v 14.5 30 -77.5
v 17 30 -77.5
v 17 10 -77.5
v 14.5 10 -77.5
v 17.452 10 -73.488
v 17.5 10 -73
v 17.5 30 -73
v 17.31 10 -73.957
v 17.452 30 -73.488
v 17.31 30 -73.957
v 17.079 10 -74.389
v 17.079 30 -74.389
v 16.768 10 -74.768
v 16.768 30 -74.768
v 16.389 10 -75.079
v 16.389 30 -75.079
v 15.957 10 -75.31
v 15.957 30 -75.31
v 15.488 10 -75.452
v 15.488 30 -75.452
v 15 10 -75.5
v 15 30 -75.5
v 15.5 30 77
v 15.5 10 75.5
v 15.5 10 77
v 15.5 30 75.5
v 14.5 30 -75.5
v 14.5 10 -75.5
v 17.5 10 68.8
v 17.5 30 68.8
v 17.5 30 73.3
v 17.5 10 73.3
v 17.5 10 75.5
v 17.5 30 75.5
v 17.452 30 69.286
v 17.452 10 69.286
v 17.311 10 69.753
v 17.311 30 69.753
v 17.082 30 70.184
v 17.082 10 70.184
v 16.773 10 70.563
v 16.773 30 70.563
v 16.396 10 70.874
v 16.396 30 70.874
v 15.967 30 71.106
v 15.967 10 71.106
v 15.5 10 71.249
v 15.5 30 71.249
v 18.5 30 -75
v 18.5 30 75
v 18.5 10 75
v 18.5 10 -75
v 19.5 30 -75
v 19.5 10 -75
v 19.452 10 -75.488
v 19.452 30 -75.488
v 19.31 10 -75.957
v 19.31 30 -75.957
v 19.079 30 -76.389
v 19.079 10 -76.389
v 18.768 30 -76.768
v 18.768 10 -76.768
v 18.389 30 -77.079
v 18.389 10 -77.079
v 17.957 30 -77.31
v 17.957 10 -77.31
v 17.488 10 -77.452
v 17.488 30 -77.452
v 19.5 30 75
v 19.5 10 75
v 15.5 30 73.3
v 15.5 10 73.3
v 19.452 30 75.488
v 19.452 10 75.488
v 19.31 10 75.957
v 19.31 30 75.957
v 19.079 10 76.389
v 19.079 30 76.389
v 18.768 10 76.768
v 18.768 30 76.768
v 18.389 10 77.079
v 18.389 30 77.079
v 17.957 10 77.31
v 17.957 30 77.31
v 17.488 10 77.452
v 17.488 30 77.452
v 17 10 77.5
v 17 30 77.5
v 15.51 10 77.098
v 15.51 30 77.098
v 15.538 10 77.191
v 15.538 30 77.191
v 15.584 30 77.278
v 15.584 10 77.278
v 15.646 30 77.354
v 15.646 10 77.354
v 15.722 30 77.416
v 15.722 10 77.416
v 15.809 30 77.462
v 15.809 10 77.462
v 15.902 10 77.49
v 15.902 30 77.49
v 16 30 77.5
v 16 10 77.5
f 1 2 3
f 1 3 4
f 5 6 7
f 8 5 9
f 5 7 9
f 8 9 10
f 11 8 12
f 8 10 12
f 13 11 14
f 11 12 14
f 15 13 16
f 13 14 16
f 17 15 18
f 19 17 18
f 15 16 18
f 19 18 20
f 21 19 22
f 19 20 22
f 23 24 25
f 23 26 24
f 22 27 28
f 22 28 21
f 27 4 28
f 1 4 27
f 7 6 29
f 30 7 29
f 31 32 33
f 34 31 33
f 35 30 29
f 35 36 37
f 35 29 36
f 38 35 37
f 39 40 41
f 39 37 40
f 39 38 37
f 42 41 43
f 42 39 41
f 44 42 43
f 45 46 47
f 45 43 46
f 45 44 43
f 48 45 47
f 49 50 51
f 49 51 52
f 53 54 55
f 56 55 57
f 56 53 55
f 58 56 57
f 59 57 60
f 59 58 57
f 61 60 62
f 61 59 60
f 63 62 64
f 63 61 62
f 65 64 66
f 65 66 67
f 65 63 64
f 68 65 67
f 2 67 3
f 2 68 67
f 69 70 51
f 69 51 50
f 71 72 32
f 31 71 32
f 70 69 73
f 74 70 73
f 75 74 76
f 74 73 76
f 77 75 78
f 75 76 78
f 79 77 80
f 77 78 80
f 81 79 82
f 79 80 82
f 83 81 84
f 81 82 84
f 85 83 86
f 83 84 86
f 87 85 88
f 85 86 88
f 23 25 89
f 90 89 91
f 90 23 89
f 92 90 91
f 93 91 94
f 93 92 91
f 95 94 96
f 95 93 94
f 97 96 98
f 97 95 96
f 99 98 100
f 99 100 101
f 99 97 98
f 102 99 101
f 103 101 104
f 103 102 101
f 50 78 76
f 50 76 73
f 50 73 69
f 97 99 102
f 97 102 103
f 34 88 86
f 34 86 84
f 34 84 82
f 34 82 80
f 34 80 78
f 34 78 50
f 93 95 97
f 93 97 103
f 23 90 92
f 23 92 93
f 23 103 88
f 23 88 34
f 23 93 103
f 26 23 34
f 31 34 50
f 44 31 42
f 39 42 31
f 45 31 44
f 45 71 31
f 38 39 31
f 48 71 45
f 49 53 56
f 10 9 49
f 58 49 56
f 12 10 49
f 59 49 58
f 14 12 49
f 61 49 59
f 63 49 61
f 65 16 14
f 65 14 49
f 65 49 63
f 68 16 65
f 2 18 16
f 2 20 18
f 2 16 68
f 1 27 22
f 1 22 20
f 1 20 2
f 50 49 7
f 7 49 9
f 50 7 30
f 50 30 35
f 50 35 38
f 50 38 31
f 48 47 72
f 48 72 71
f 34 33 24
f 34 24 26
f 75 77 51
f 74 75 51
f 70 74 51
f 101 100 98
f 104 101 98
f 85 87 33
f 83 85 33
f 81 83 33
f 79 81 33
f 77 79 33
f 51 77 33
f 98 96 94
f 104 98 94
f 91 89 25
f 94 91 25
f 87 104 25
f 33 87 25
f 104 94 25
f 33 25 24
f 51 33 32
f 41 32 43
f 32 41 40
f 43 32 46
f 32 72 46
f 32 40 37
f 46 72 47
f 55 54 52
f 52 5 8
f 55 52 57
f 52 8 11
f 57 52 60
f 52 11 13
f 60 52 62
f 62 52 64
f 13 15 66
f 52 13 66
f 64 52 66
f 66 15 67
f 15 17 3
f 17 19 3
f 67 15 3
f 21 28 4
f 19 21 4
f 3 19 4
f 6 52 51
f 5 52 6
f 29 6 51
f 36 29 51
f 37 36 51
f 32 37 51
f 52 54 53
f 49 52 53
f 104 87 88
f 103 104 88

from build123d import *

# Parameters (mm, degrees)
SKETCH1_W                       = 39
SKETCH1_H                       = 155
BOSS_EXTRUDE1_DEPTH             = 2
BOSS_EXTRUDE2_DEPTH             = 38
SKETCH3_W                       = 2
SKETCH3_H                       = 2
BOSS_EXTRUDE3_DEPTH             = 38
SKETCH4_W                       = 2
SKETCH4_H                       = 2
BOSS_EXTRUDE4_DEPTH             = 151
SKETCH6_W                       = 35
SKETCH6_H                       = 2.2
CUT_EXTRUDE1_DEPTH              = 160.340045186
SKETCH7_W                       = 35
SKETCH7_H                       = 2.2
CUT_EXTRUDE2_DEPTH              = 89.490112442
SKETCH5_W                       = 31
SKETCH5_H                       = 2
BOSS_EXTRUDE5_DEPTH             = 2
BOSS_EXTRUDE6_REACH             = 91.367
SKETCH8_W                       = 2
SKETCH8_H                       = 2
BOSS_EXTRUDE6_DIRECTION_2_REACH = 91.367
SKETCH10_W                      = 2
SKETCH10_H                      = 2.2
SKETCH10_W_2                    = 2.2
SKETCH10_H_2                    = 2
BOSS_EXTRUDE8_DEPTH             = 2
SKETCH11_W                      = 2
SKETCH11_H                      = 2.2
SKETCH11_W_2                    = 2.2
SKETCH11_H_2                    = 2
BOSS_EXTRUDE9_DEPTH             = 2
FILLET2_R                       = 2.5
SKETCH14_W                      = 36.5
SKETCH14_H                      = 7.75
BOSS_EXTRUDE10_DEPTH            = 2
SKETCH13_W                      = 31
SKETCH13_H                      = 3
CUT_EXTRUDE4_DEPTH              = 2
FILLET3_R                       = 2
FILLET4_R                       = 0.5
SKETCH15_R                      = 5.1
CUT_EXTRUDE5_DEPTH              = 90.367219941
SKETCH16_R                      = 7.1
BOSS_EXTRUDE11_DEPTH            = 1
FILLET5_R                       = 0.5
CUT_EXTRUDE3_DEPTH              = 160.340045186
FILLET6_R                       = 0.4
FILLET7_R                       = 0.5
CUT_EXTRUDE6_DEPTH              = 6
SKETCH18_W                      = 29
SKETCH18_H                      = 3
CUT_EXTRUDE8_DEPTH              = 90.367220028
CUT_EXTRUDE11_DEPTH             = 90.367220028
CUT_EXTRUDE11_DEPTH_BACK        = 90.367220028
SKETCH20_W                      = 29
SKETCH20_H                      = 34
SKETCH21_W                      = 155
SKETCH21_H                      = 10
CUT_EXTRUDE12_DEPTH             = 90.367219941
SKETCH22_W                      = 150
SKETCH22_H                      = 20
CUT_EXTRUDE13_DEPTH             = 1


with BuildPart() as part:
    # Sketch1 → Boss-Extrude1 (new body)
    with BuildSketch(Plane(origin=(0, 0, 0), x_dir=(1, 0, 0), z_dir=(0, 1, 0))):
        Rectangle(SKETCH1_W, SKETCH1_H)
    extrude(amount=BOSS_EXTRUDE1_DEPTH)

    # Sketch2 → Boss-Extrude2 (add)
    with BuildSketch(Plane(origin=(0, 2, 0), x_dir=(1, 0, 0), z_dir=(0, 1, 0))):
        Polygon((-17.5, -77.5), (-17.5, -75.5), (-17.5, 75.5), (17.5, 75.5), (17.5, -75.5), (17.5, -77.5), (19.5, -77.5), (19.5, 77.5), (-19.5, 77.5), (-19.5, -77.5), align=None)
    extrude(amount=BOSS_EXTRUDE2_DEPTH)

    # Sketch3 → Boss-Extrude3 (add)
    with BuildSketch(Plane(origin=(0, 2, 0), x_dir=(1, 0, 0), z_dir=(0, 1, 0))):
        with Locations((-16.5, -76.5)):
            Rectangle(SKETCH3_W, SKETCH3_H)
        with Locations((-16.5, -72.3)):
            Rectangle(SKETCH3_W, SKETCH3_H)
        with Locations((16.5, -76.5)):
            Rectangle(SKETCH3_W, SKETCH3_H)
        with Locations((16.5, -72.3)):
            Rectangle(SKETCH3_W, SKETCH3_H)
    extrude(amount=BOSS_EXTRUDE3_DEPTH)

    # Sketch4 → Boss-Extrude4 (add)
    with BuildSketch(Plane.XY.offset(-75.5)):
        with Locations((-16.5, 39)):
            Rectangle(SKETCH4_W, SKETCH4_H)
        Polygon((-15.5, 33.8), (-17.5, 31.8), (-17.5, 35.8), (-15.5, 35.8), align=None)
        Polygon((15.5, 35.8), (17.5, 35.8), (17.5, 31.8), (15.5, 33.8), align=None)
        with Locations((16.5, 39)):
            Rectangle(SKETCH4_W, SKETCH4_H)
    extrude(amount=BOSS_EXTRUDE4_DEPTH)

    # Sketch6 → Cut-Extrude1 (cut, through all)
    with BuildSketch(Plane.XY.offset(-75.5)):
        with Locations((0, 36.9)):
            Rectangle(SKETCH6_W, SKETCH6_H)
    extrude(amount=CUT_EXTRUDE1_DEPTH, mode=Mode.SUBTRACT)

    # Sketch7 → Cut-Extrude2 (cut, through all)
    with BuildSketch(Plane(origin=(0, 2, 0), x_dir=(1, 0, 0), z_dir=(0, 1, 0))):
        with Locations((0, -74.4)):
            Rectangle(SKETCH7_W, SKETCH7_H)
    extrude(amount=CUT_EXTRUDE2_DEPTH, mode=Mode.SUBTRACT)

    # Sketch5 → Boss-Extrude5 (add)
    with BuildSketch(Plane(origin=(0, 2, 0), x_dir=(1, 0, 0), z_dir=(0, 1, 0))):
        with Locations((0, -76.5)):
            Rectangle(SKETCH5_W, SKETCH5_H)
        with Locations((0, -72.3)):
            Rectangle(SKETCH5_W, SKETCH5_H)
    extrude(amount=BOSS_EXTRUDE5_DEPTH)

    # Boss-Extrude6: up to this face of the body (flat: up to its plane)
    boss_extrude6_end = Plane(part.part.faces().sort_by_distance((17.5, 16.9, -2.1))[0])
    # Sketch8 → Boss-Extrude6 (add, up to the picked face)
    with BuildSketch(Plane(origin=(0, 0, 0), x_dir=(0, 0, -1), z_dir=(1, 0, 0)), mode=Mode.PRIVATE) as boss_extrude6_sk1:
        with Locations((74.5, 39)):
            Rectangle(SKETCH8_W, SKETCH8_H)
    boss_extrude6_tool1 = split(extrude(boss_extrude6_sk1.sketch, amount=BOSS_EXTRUDE6_REACH, mode=Mode.PRIVATE), bisect_by=boss_extrude6_end, keep=Keep.BOTH, mode=Mode.PRIVATE)
    # Sketch8 → Boss-Extrude6 (add, up to the picked face)
    with BuildSketch(Plane(origin=(0, 0, 0), x_dir=(0, 0, -1), z_dir=(1, 0, 0)), mode=Mode.PRIVATE) as boss_extrude6_sk2:
        Polygon((75.5, 35.8), (73.5, 35.8), (73.5, 33.8), (75.5, 31.8), align=None)
    boss_extrude6_tool2 = split(extrude(boss_extrude6_sk2.sketch, amount=BOSS_EXTRUDE6_REACH, mode=Mode.PRIVATE), bisect_by=boss_extrude6_end, keep=Keep.BOTH, mode=Mode.PRIVATE)
    add(boss_extrude6_tool1.solids().sort_by(Axis((0, 39, -74.5), (1, 0, 0)))[0])
    add(boss_extrude6_tool2.solids().sort_by(Axis((0, 34.244444, -74.611111), (1, 0, 0)))[0])

    # Boss-Extrude6 direction 2: up to this face of the body (flat: up to its plane)
    boss_extrude6_direction_2_end = Plane(part.part.faces().sort_by_distance((-17.5, 16.9, -2.1))[0])
    # Sketch8 → Boss-Extrude6 direction 2 (add, up to the picked face)
    with BuildSketch(Plane(origin=(0, 0, 0), x_dir=(0, 0, -1), z_dir=(1, 0, 0)), mode=Mode.PRIVATE) as boss_extrude6_direction_2_sk1:
        with Locations((74.5, 39)):
            Rectangle(SKETCH8_W, SKETCH8_H)
    boss_extrude6_direction_2_tool1 = split(extrude(boss_extrude6_direction_2_sk1.sketch, amount=-BOSS_EXTRUDE6_DIRECTION_2_REACH, mode=Mode.PRIVATE), bisect_by=boss_extrude6_direction_2_end, keep=Keep.BOTH, mode=Mode.PRIVATE)
    # Sketch8 → Boss-Extrude6 direction 2 (add, up to the picked face)
    with BuildSketch(Plane(origin=(0, 0, 0), x_dir=(0, 0, -1), z_dir=(1, 0, 0)), mode=Mode.PRIVATE) as boss_extrude6_direction_2_sk2:
        Polygon((75.5, 35.8), (73.5, 35.8), (73.5, 33.8), (75.5, 31.8), align=None)
    boss_extrude6_direction_2_tool2 = split(extrude(boss_extrude6_direction_2_sk2.sketch, amount=-BOSS_EXTRUDE6_DIRECTION_2_REACH, mode=Mode.PRIVATE), bisect_by=boss_extrude6_direction_2_end, keep=Keep.BOTH, mode=Mode.PRIVATE)
    add(boss_extrude6_direction_2_tool1.solids().sort_by(Axis((0, 39, -74.5), (-1, 0, 0)))[0])
    add(boss_extrude6_direction_2_tool2.solids().sort_by(Axis((0, 34.244444, -74.611111), (-1, 0, 0)))[0])

    # Sketch10 → Boss-Extrude8 (add)
    with BuildSketch(Plane(origin=(-17.5, 0, 0), x_dir=(0, 0, -1), z_dir=(1, 0, 0))):
        with Locations((-76.5, 36.9)):
            Rectangle(SKETCH10_W, SKETCH10_H)
        with Locations((-74.4, 39)):
            Rectangle(SKETCH10_W_2, SKETCH10_H_2)
    extrude(amount=BOSS_EXTRUDE8_DEPTH)

    # Sketch11 → Boss-Extrude9 (add)
    with BuildSketch(Plane.ZY.offset(-17.5)):
        with Locations((76.5, 36.9)):
            Rectangle(SKETCH11_W, SKETCH11_H)
        with Locations((74.4, 39)):
            Rectangle(SKETCH11_W_2, SKETCH11_H_2)
    extrude(amount=BOSS_EXTRUDE9_DEPTH)

    # Fillet2
    fillet2_edges = [part.edges().sort_by_distance(p)[0] for p in [
        (-17.5, 16.9, 71.3),
        (17.5, 16.9, 71.3),
        (19.5, 20, 77.5),
        (-19.5, 20, 77.5),
        (-19.5, 20, -77.5),
        (-17.5, 16.9, -75.5),
        (17.5, 16.9, -75.5),
        (19.5, 20, -77.5),
        (19.5, 40, 0),
        (-19.5, 40, 0),
        (19.5, 0, 0),
        (-19.5, 0, 0),
        (0, 40, -77.5),
        (0, 0, 77.5),
        (0, 0, -77.5),
        (-17.5, 40, 77.5),
        (17.5, 40, 77.5),
    ]]
    fillet(fillet2_edges, radius=FILLET2_R)

    # Sketch14 → Boss-Extrude10 (add)
    with BuildSketch(Plane.XY.offset(-75.5)):
        with Locations((0, 5.125)):
            Rectangle(SKETCH14_W, SKETCH14_H)
    extrude(amount=BOSS_EXTRUDE10_DEPTH)

    # Sketch13 → Cut-Extrude4 (cut)
    with BuildSketch(Plane(origin=(0, 0, -77.5), x_dir=(-1, 0, 0), z_dir=(0, 0, -1))):
        with Locations((0, 5.5)):
            Rectangle(SKETCH13_W, SKETCH13_H)
    extrude(amount=-CUT_EXTRUDE4_DEPTH, mode=Mode.SUBTRACT)

    # Fillet3
    fillet3_edges = [part.edges().sort_by_distance(p)[0] for p in [
        (0, 9, -73.5),
    ]]
    fillet(fillet3_edges, radius=FILLET3_R - 0.0001)  # a hair under: the kernel refuses the full size

    # Fillet4
    fillet4_edges = [part.edges().sort_by_distance(p)[0] for p in [
        (15.5, 5.5, -75.5),
        (15.5, 4, -76.5),
        (0, 7, -75.5),
        (15.5, 7, -76.5),
        (-15.5, 5.5, -75.5),
        (-15.5, 7, -76.5),
        (0, 4, -75.5),
        (-15.5, 4, -76.5),
        (15.5, 5.5, -77.5),
        (0, 4, -77.5),
        (-15.5, 5.5, -77.5),
        (0, 7, -77.5),
    ]]
    fillet(fillet4_edges, radius=FILLET4_R)

    # Sketch15 → Cut-Extrude5 (cut, through all)
    with BuildSketch(Plane.XZ):
        with Locations(Location((0, 38.75, 0), (0, 0, 270))):
            Circle(SKETCH15_R)
        with Locations(Location((0, -38.75, 0), (0, 0, 270))):
            Circle(SKETCH15_R)
    extrude(amount=-CUT_EXTRUDE5_DEPTH, mode=Mode.SUBTRACT)

    # Sketch16 → Boss-Extrude11 (add)
    with BuildSketch(Plane(origin=(0, 2, 0), x_dir=(1, 0, 0), z_dir=(0, 1, 0))):
        with Locations(Location((0, 38.75, 0), (0, 0, 270))):
            Circle(SKETCH16_R)
        with Locations(Location((0, -38.75, 0), (0, 0, 270))):
            Circle(SKETCH16_R)
    extrude(amount=BOSS_EXTRUDE11_DEPTH)

    # Fillet5
    fillet5_edges = [part.edges().sort_by_distance(p)[0] for p in [
        (0, 2, -45.85),
        (0, 3, -45.85),
        (0, 2, 31.65),
        (0, 3, 31.65),
    ]]
    fillet(fillet5_edges, radius=FILLET5_R - 0.0001)  # a hair under: the kernel refuses the full size

    # Sketch12 → Cut-Extrude3 (cut, through all)
    with BuildSketch(Plane.XY.offset(-75.5)):
        with BuildLine():
            Line((1.668907005, 12.688040659), (2.22520934, 10.250720878))
            ThreePointArc((2.22520934, 10.250720878), (4.338837391, 10.990311321), (6.234898019, 12.181685175))
            Line((6.234898019, 12.181685175), (4.676173514, 14.136263881))
            ThreePointArc((4.676173514, 14.136263881), (3.254128043, 13.242733491), (1.668907005, 12.688040659))
        make_face()
        with BuildLine():
            ThreePointArc((-6.234898019, 12.181685175), (-4.338837391, 10.990311321), (-2.22520934, 10.250720878))
            Line((-2.22520934, 10.250720878), (-1.668907005, 12.688040659))
            ThreePointArc((-1.668907005, 12.688040659), (-3.254128043, 13.242733491), (-4.676173514, 14.136263881))
            Line((-4.676173514, 14.136263881), (-6.234898019, 12.181685175))
        make_face()
        with BuildLine():
            ThreePointArc((-10, 20), (-9.749279122, 17.77479066), (-9.009688679, 15.661162609))
            Line((-9.009688679, 15.661162609), (-6.757266509, 16.745871957))
            ThreePointArc((-6.757266509, 16.745871957), (-7.311959341, 18.331092995), (-7.5, 20))
            Line((-7.5, 20), (-10, 20))
        make_face()
        with BuildLine():
            ThreePointArc((-6.234898019, 27.818314825), (-7.818314825, 26.234898019), (-9.009688679, 24.338837391))
            Line((-9.009688679, 24.338837391), (-6.757266509, 23.254128043))
            ThreePointArc((-6.757266509, 23.254128043), (-5.863736119, 24.676173514), (-4.676173514, 25.863736119))
            Line((-4.676173514, 25.863736119), (-6.234898019, 27.818314825))
        make_face()
        with BuildLine():
            ThreePointArc((-1.668907005, 27.311959341), (-0.839733571, 27.452841574), (0, 27.5))
            Line((0, 27.5), (0, 30))
            ThreePointArc((0, 30), (-1.119644761, 29.937122099), (-2.22520934, 29.749279122))
            Line((-2.22520934, 29.749279122), (-1.668907005, 27.311959341))
        make_face()
        with BuildLine():
            Line((0, 30), (0, 27.5))
            ThreePointArc((0, 27.5), (0.839733571, 27.452841574), (1.668907005, 27.311959341))
            Line((1.668907005, 27.311959341), (2.22520934, 29.749279122))
            ThreePointArc((2.22520934, 29.749279122), (1.119644761, 29.937122099), (0, 30))
        make_face()
        with BuildLine():
            Line((6.757266509, 23.254128043), (9.009688679, 24.338837391))
            ThreePointArc((9.009688679, 24.338837391), (7.818314825, 26.234898019), (6.234898019, 27.818314825))
            Line((6.234898019, 27.818314825), (4.676173514, 25.863736119))
            ThreePointArc((4.676173514, 25.863736119), (5.863736119, 24.676173514), (6.757266509, 23.254128043))
        make_face()
        with BuildLine():
            Line((6.757266509, 16.745871957), (9.009688679, 15.661162609))
            ThreePointArc((9.009688679, 15.661162609), (9.749279122, 17.77479066), (10, 20))
            Line((10, 20), (7.5, 20))
            ThreePointArc((7.5, 20), (7.311959341, 18.331092995), (6.757266509, 16.745871957))
        make_face()
        with BuildLine():
            ThreePointArc((2.5, 20), (2.43731978, 19.443697665), (2.25242217, 18.915290652))
            Line((2.25242217, 18.915290652), (4.50484434, 17.830581304))
            ThreePointArc((4.50484434, 17.830581304), (4.874639561, 18.88739533), (5, 20))
            Line((5, 20), (2.5, 20))
        make_face()
        with BuildLine():
            ThreePointArc((1.558724505, 21.954578706), (1.954578706, 21.558724505), (2.25242217, 21.084709348))
            Line((2.25242217, 21.084709348), (4.50484434, 22.169418696))
            ThreePointArc((4.50484434, 22.169418696), (3.909157412, 23.117449009), (3.117449009, 23.909157412))
            Line((3.117449009, 23.909157412), (1.558724505, 21.954578706))
        make_face()
        with BuildLine():
            Line((0, 25), (0, 22.5))
            ThreePointArc((0, 22.5), (0.27991119, 22.484280525), (0.556302335, 22.43731978))
            Line((0.556302335, 22.43731978), (1.11260467, 24.874639561))
            ThreePointArc((1.11260467, 24.874639561), (0.559822381, 24.968561049), (0, 25))
        make_face()
        with BuildLine():
            ThreePointArc((-0.556302335, 22.43731978), (-0.27991119, 22.484280525), (0, 22.5))
            Line((0, 22.5), (0, 25))
            ThreePointArc((0, 25), (-0.559822381, 24.968561049), (-1.11260467, 24.874639561))
            Line((-1.11260467, 24.874639561), (-0.556302335, 22.43731978))
        make_face()
        with BuildLine():
            ThreePointArc((-2.25242217, 21.084709348), (-1.954578706, 21.558724505), (-1.558724505, 21.954578706))
            Line((-1.558724505, 21.954578706), (-3.117449009, 23.909157412))
            ThreePointArc((-3.117449009, 23.909157412), (-3.909157412, 23.117449009), (-4.50484434, 22.169418696))
            Line((-4.50484434, 22.169418696), (-2.25242217, 21.084709348))
        make_face()
        with BuildLine():
            ThreePointArc((-2.25242217, 18.915290652), (-2.43731978, 19.443697665), (-2.5, 20))
            Line((-2.5, 20), (-5, 20))
            ThreePointArc((-5, 20), (-4.874639561, 18.88739533), (-4.50484434, 17.830581304))
            Line((-4.50484434, 17.830581304), (-2.25242217, 18.915290652))
        make_face()
        with BuildLine():
            ThreePointArc((-3.117449009, 16.090842588), (-2.169418696, 15.49515566), (-1.11260467, 15.125360439))
            Line((-1.11260467, 15.125360439), (-0.556302335, 17.56268022))
            ThreePointArc((-0.556302335, 17.56268022), (-1.084709348, 17.74757783), (-1.558724505, 18.045421294))
            Line((-1.558724505, 18.045421294), (-3.117449009, 16.090842588))
        make_face()
        with BuildLine():
            Line((0.556302335, 17.56268022), (1.11260467, 15.125360439))
            ThreePointArc((1.11260467, 15.125360439), (2.169418696, 15.49515566), (3.117449009, 16.090842588))
            Line((3.117449009, 16.090842588), (1.558724505, 18.045421294))
            ThreePointArc((1.558724505, 18.045421294), (1.084709348, 17.74757783), (0.556302335, 17.56268022))
        make_face()
    extrude(amount=-CUT_EXTRUDE3_DEPTH, mode=Mode.SUBTRACT)

    # Fillet6
    fillet6_edges = [part.edges().sort_by_distance(p)[0] for p in [
        (5.863736119, 24.676173514, -75.5),
        (5.455535766, 26.841025472, -75.5),
        (7.818314825, 26.234898019, -77.5),
        (7.883477594, 23.796482717, -77.5),
        (5.863736119, 24.676173514, -77.5),
        (5.455535766, 26.841025472, -77.5),
        (7.883477594, 23.796482717, -75.5),
        (7.818314825, 26.234898019, -75.5),
        (7.311959341, 18.331092995, -75.5),
        (8.75, 20, -75.5),
        (9.749279122, 17.77479066, -77.5),
        (7.883477594, 16.203517283, -77.5),
        (7.311959341, 18.331092995, -77.5),
        (8.75, 20, -77.5),
        (7.883477594, 16.203517283, -75.5),
        (9.749279122, 17.77479066, -75.5),
        (2.43731978, 19.443697665, -75.5),
        (3.75, 20, -75.5),
        (4.874639561, 18.88739533, -77.5),
        (3.378633255, 18.372935978, -77.5),
        (2.43731978, 19.443697665, -77.5),
        (3.75, 20, -77.5),
        (3.378633255, 18.372935978, -75.5),
        (4.874639561, 18.88739533, -75.5),
        (1.954578706, 21.558724505, -75.5),
        (2.338086757, 22.931868059, -75.5),
        (3.909157412, 23.117449009, -77.5),
        (3.378633255, 21.627064022, -77.5),
        (1.954578706, 21.558724505, -77.5),
        (2.338086757, 22.931868059, -77.5),
        (3.378633255, 21.627064022, -75.5),
        (3.909157412, 23.117449009, -75.5),
        (0, 27.5, -75.5),
        (-1.947058172, 28.530619232, -75.5),
        (0, 30, -77.5),
        (1.947058172, 28.530619232, -77.5),
        (0, 27.5, -77.5),
        (-1.947058172, 28.530619232, -77.5),
        (1.947058172, 28.530619232, -75.5),
        (0, 30, -75.5),
        (-5.863736119, 24.676173514, -75.5),
        (-7.883477594, 23.796482717, -75.5),
        (-7.818314825, 26.234898019, -77.5),
        (-5.455535766, 26.841025472, -77.5),
        (-5.863736119, 24.676173514, -77.5),
        (-7.883477594, 23.796482717, -77.5),
        (-5.455535766, 26.841025472, -75.5),
        (-7.818314825, 26.234898019, -75.5),
        (-7.311959341, 18.331092995, -75.5),
        (-7.883477594, 16.203517283, -75.5),
        (-9.749279122, 17.77479066, -77.5),
        (-8.75, 20, -77.5),
        (-7.311959341, 18.331092995, -77.5),
        (-7.883477594, 16.203517283, -77.5),
        (-8.75, 20, -75.5),
        (-9.749279122, 17.77479066, -75.5),
        (-3.254128043, 13.242733491, -75.5),
        (-1.947058172, 11.469380768, -75.5),
        (-4.338837391, 10.990311321, -77.5),
        (-5.455535766, 13.158974528, -77.5),
        (-3.254128043, 13.242733491, -77.5),
        (-1.947058172, 11.469380768, -77.5),
        (-5.455535766, 13.158974528, -75.5),
        (-4.338837391, 10.990311321, -75.5),
        (1.084709348, 17.74757783, -75.5),
        (2.338086757, 17.068131941, -75.5),
        (2.169418696, 15.49515566, -77.5),
        (0.834453502, 16.344020329, -77.5),
        (1.084709348, 17.74757783, -77.5),
        (2.338086757, 17.068131941, -77.5),
        (0.834453502, 16.344020329, -75.5),
        (2.169418696, 15.49515566, -75.5),
        (-2.43731978, 19.443697665, -75.5),
        (-3.378633255, 18.372935978, -75.5),
        (-4.874639561, 18.88739533, -77.5),
        (-3.75, 20, -77.5),
        (-2.43731978, 19.443697665, -77.5),
        (-3.378633255, 18.372935978, -77.5),
        (-3.75, 20, -75.5),
        (-4.874639561, 18.88739533, -75.5),
        (-1.084709348, 17.74757783, -75.5),
        (-0.834453502, 16.344020329, -75.5),
        (-2.169418696, 15.49515566, -77.5),
        (-2.338086757, 17.068131941, -77.5),
        (-1.084709348, 17.74757783, -77.5),
        (-0.834453502, 16.344020329, -77.5),
        (-2.338086757, 17.068131941, -75.5),
        (-2.169418696, 15.49515566, -75.5),
        (-1.954578706, 21.558724505, -75.5),
        (-3.378633255, 21.627064022, -75.5),
        (-3.909157412, 23.117449009, -77.5),
        (-2.338086757, 22.931868059, -77.5),
        (-1.954578706, 21.558724505, -77.5),
        (-3.378633255, 21.627064022, -77.5),
        (-2.338086757, 22.931868059, -75.5),
        (-3.909157412, 23.117449009, -75.5),
        (0, 25, -77.5),
        (0.834453502, 23.655979671, -77.5),
        (0, 22.5, -75.5),
        (-0.834453502, 23.655979671, -75.5),
        (0, 22.5, -77.5),
        (-0.834453502, 23.655979671, -77.5),
        (0, 25, -75.5),
        (0.834453502, 23.655979671, -75.5),
        (3.254128043, 13.242733491, -75.5),
        (5.455535766, 13.158974528, -75.5),
        (4.338837391, 10.990311321, -77.5),
        (1.947058172, 11.469380768, -77.5),
        (3.254128043, 13.242733491, -77.5),
        (5.455535766, 13.158974528, -77.5),
        (1.947058172, 11.469380768, -75.5),
        (4.338837391, 10.990311321, -75.5),
    ]]
    fillet(fillet6_edges, radius=FILLET6_R)

    # Fillet7
    fillet7_edges = [part.edges().sort_by_distance(p)[0] for p in [
        (15.5, 40, 0.75),
        (0, 4, 77.5),
        (0, 40, -73.5),
        (-15.5, 40, 0.75),
        (-15.5, 20.75, 77.5),
        (-15.5, 39.267766953, 76.767766953),
        (15.5, 20.75, 77.5),
        (15.5, 39.267766953, 76.767766953),
    ]]
    fillet(fillet7_edges, radius=FILLET7_R)

    # Sketch17 → Cut-Extrude6 (cut)
    with BuildSketch(Plane.XZ):
        Polygon((-17, -77.5), (-17, 70.299999999), (-14.999999999, 71.3), (-14.999999999, 77.5), (14.999999999, 77.5), (14.999999999, 71.3), (17, 70.299999999), (17, -77.5), align=None)
    extrude(amount=-CUT_EXTRUDE6_DEPTH, mode=Mode.SUBTRACT)

    # Sketch18 → Cut-Extrude8 (cut, through all)
    with BuildSketch(Plane.XY):
        with Locations((0, 7.5)):
            Rectangle(SKETCH18_W, SKETCH18_H)
    extrude(amount=-CUT_EXTRUDE8_DEPTH, mode=Mode.SUBTRACT)

    # Sketch20 → Cut-Extrude11 (cut, two sides: drawn at the far end of the back side and taken through both)
    with BuildSketch(Plane.XY.offset(-CUT_EXTRUDE11_DEPTH_BACK)):
        with Locations((0, 23)):
            Rectangle(SKETCH20_W, SKETCH20_H)
    extrude(amount=CUT_EXTRUDE11_DEPTH + CUT_EXTRUDE11_DEPTH_BACK, mode=Mode.SUBTRACT)


with BuildPart() as body_2:
    # of the pieces the cut leaves, the one that is kept (cut_extrude11_keep)
    add(part.part.solids().sort_by_distance((14.5, 40, -75))[0])

    # Sketch21 → Cut-Extrude12 (cut, through all)
    with BuildSketch(Plane(origin=(0, 0, 0), x_dir=(0, 0, -1), z_dir=(1, 0, 0))):
        with Locations((0, 35)):
            Rectangle(SKETCH21_W, SKETCH21_H)
        with Locations((0, 5)):
            Rectangle(SKETCH21_W, SKETCH21_H)
    extrude(amount=CUT_EXTRUDE12_DEPTH, mode=Mode.SUBTRACT)

    # Sketch22 → Cut-Extrude13 (cut)
    with BuildSketch(Plane(origin=(19.5, 0, 0), x_dir=(0, 0, -1), z_dir=(1, 0, 0))):
        with Locations((0, 20)):
            Rectangle(SKETCH22_W, SKETCH22_H)
    extrude(amount=-CUT_EXTRUDE13_DEPTH, mode=Mode.SUBTRACT)


solid = body_2.part
